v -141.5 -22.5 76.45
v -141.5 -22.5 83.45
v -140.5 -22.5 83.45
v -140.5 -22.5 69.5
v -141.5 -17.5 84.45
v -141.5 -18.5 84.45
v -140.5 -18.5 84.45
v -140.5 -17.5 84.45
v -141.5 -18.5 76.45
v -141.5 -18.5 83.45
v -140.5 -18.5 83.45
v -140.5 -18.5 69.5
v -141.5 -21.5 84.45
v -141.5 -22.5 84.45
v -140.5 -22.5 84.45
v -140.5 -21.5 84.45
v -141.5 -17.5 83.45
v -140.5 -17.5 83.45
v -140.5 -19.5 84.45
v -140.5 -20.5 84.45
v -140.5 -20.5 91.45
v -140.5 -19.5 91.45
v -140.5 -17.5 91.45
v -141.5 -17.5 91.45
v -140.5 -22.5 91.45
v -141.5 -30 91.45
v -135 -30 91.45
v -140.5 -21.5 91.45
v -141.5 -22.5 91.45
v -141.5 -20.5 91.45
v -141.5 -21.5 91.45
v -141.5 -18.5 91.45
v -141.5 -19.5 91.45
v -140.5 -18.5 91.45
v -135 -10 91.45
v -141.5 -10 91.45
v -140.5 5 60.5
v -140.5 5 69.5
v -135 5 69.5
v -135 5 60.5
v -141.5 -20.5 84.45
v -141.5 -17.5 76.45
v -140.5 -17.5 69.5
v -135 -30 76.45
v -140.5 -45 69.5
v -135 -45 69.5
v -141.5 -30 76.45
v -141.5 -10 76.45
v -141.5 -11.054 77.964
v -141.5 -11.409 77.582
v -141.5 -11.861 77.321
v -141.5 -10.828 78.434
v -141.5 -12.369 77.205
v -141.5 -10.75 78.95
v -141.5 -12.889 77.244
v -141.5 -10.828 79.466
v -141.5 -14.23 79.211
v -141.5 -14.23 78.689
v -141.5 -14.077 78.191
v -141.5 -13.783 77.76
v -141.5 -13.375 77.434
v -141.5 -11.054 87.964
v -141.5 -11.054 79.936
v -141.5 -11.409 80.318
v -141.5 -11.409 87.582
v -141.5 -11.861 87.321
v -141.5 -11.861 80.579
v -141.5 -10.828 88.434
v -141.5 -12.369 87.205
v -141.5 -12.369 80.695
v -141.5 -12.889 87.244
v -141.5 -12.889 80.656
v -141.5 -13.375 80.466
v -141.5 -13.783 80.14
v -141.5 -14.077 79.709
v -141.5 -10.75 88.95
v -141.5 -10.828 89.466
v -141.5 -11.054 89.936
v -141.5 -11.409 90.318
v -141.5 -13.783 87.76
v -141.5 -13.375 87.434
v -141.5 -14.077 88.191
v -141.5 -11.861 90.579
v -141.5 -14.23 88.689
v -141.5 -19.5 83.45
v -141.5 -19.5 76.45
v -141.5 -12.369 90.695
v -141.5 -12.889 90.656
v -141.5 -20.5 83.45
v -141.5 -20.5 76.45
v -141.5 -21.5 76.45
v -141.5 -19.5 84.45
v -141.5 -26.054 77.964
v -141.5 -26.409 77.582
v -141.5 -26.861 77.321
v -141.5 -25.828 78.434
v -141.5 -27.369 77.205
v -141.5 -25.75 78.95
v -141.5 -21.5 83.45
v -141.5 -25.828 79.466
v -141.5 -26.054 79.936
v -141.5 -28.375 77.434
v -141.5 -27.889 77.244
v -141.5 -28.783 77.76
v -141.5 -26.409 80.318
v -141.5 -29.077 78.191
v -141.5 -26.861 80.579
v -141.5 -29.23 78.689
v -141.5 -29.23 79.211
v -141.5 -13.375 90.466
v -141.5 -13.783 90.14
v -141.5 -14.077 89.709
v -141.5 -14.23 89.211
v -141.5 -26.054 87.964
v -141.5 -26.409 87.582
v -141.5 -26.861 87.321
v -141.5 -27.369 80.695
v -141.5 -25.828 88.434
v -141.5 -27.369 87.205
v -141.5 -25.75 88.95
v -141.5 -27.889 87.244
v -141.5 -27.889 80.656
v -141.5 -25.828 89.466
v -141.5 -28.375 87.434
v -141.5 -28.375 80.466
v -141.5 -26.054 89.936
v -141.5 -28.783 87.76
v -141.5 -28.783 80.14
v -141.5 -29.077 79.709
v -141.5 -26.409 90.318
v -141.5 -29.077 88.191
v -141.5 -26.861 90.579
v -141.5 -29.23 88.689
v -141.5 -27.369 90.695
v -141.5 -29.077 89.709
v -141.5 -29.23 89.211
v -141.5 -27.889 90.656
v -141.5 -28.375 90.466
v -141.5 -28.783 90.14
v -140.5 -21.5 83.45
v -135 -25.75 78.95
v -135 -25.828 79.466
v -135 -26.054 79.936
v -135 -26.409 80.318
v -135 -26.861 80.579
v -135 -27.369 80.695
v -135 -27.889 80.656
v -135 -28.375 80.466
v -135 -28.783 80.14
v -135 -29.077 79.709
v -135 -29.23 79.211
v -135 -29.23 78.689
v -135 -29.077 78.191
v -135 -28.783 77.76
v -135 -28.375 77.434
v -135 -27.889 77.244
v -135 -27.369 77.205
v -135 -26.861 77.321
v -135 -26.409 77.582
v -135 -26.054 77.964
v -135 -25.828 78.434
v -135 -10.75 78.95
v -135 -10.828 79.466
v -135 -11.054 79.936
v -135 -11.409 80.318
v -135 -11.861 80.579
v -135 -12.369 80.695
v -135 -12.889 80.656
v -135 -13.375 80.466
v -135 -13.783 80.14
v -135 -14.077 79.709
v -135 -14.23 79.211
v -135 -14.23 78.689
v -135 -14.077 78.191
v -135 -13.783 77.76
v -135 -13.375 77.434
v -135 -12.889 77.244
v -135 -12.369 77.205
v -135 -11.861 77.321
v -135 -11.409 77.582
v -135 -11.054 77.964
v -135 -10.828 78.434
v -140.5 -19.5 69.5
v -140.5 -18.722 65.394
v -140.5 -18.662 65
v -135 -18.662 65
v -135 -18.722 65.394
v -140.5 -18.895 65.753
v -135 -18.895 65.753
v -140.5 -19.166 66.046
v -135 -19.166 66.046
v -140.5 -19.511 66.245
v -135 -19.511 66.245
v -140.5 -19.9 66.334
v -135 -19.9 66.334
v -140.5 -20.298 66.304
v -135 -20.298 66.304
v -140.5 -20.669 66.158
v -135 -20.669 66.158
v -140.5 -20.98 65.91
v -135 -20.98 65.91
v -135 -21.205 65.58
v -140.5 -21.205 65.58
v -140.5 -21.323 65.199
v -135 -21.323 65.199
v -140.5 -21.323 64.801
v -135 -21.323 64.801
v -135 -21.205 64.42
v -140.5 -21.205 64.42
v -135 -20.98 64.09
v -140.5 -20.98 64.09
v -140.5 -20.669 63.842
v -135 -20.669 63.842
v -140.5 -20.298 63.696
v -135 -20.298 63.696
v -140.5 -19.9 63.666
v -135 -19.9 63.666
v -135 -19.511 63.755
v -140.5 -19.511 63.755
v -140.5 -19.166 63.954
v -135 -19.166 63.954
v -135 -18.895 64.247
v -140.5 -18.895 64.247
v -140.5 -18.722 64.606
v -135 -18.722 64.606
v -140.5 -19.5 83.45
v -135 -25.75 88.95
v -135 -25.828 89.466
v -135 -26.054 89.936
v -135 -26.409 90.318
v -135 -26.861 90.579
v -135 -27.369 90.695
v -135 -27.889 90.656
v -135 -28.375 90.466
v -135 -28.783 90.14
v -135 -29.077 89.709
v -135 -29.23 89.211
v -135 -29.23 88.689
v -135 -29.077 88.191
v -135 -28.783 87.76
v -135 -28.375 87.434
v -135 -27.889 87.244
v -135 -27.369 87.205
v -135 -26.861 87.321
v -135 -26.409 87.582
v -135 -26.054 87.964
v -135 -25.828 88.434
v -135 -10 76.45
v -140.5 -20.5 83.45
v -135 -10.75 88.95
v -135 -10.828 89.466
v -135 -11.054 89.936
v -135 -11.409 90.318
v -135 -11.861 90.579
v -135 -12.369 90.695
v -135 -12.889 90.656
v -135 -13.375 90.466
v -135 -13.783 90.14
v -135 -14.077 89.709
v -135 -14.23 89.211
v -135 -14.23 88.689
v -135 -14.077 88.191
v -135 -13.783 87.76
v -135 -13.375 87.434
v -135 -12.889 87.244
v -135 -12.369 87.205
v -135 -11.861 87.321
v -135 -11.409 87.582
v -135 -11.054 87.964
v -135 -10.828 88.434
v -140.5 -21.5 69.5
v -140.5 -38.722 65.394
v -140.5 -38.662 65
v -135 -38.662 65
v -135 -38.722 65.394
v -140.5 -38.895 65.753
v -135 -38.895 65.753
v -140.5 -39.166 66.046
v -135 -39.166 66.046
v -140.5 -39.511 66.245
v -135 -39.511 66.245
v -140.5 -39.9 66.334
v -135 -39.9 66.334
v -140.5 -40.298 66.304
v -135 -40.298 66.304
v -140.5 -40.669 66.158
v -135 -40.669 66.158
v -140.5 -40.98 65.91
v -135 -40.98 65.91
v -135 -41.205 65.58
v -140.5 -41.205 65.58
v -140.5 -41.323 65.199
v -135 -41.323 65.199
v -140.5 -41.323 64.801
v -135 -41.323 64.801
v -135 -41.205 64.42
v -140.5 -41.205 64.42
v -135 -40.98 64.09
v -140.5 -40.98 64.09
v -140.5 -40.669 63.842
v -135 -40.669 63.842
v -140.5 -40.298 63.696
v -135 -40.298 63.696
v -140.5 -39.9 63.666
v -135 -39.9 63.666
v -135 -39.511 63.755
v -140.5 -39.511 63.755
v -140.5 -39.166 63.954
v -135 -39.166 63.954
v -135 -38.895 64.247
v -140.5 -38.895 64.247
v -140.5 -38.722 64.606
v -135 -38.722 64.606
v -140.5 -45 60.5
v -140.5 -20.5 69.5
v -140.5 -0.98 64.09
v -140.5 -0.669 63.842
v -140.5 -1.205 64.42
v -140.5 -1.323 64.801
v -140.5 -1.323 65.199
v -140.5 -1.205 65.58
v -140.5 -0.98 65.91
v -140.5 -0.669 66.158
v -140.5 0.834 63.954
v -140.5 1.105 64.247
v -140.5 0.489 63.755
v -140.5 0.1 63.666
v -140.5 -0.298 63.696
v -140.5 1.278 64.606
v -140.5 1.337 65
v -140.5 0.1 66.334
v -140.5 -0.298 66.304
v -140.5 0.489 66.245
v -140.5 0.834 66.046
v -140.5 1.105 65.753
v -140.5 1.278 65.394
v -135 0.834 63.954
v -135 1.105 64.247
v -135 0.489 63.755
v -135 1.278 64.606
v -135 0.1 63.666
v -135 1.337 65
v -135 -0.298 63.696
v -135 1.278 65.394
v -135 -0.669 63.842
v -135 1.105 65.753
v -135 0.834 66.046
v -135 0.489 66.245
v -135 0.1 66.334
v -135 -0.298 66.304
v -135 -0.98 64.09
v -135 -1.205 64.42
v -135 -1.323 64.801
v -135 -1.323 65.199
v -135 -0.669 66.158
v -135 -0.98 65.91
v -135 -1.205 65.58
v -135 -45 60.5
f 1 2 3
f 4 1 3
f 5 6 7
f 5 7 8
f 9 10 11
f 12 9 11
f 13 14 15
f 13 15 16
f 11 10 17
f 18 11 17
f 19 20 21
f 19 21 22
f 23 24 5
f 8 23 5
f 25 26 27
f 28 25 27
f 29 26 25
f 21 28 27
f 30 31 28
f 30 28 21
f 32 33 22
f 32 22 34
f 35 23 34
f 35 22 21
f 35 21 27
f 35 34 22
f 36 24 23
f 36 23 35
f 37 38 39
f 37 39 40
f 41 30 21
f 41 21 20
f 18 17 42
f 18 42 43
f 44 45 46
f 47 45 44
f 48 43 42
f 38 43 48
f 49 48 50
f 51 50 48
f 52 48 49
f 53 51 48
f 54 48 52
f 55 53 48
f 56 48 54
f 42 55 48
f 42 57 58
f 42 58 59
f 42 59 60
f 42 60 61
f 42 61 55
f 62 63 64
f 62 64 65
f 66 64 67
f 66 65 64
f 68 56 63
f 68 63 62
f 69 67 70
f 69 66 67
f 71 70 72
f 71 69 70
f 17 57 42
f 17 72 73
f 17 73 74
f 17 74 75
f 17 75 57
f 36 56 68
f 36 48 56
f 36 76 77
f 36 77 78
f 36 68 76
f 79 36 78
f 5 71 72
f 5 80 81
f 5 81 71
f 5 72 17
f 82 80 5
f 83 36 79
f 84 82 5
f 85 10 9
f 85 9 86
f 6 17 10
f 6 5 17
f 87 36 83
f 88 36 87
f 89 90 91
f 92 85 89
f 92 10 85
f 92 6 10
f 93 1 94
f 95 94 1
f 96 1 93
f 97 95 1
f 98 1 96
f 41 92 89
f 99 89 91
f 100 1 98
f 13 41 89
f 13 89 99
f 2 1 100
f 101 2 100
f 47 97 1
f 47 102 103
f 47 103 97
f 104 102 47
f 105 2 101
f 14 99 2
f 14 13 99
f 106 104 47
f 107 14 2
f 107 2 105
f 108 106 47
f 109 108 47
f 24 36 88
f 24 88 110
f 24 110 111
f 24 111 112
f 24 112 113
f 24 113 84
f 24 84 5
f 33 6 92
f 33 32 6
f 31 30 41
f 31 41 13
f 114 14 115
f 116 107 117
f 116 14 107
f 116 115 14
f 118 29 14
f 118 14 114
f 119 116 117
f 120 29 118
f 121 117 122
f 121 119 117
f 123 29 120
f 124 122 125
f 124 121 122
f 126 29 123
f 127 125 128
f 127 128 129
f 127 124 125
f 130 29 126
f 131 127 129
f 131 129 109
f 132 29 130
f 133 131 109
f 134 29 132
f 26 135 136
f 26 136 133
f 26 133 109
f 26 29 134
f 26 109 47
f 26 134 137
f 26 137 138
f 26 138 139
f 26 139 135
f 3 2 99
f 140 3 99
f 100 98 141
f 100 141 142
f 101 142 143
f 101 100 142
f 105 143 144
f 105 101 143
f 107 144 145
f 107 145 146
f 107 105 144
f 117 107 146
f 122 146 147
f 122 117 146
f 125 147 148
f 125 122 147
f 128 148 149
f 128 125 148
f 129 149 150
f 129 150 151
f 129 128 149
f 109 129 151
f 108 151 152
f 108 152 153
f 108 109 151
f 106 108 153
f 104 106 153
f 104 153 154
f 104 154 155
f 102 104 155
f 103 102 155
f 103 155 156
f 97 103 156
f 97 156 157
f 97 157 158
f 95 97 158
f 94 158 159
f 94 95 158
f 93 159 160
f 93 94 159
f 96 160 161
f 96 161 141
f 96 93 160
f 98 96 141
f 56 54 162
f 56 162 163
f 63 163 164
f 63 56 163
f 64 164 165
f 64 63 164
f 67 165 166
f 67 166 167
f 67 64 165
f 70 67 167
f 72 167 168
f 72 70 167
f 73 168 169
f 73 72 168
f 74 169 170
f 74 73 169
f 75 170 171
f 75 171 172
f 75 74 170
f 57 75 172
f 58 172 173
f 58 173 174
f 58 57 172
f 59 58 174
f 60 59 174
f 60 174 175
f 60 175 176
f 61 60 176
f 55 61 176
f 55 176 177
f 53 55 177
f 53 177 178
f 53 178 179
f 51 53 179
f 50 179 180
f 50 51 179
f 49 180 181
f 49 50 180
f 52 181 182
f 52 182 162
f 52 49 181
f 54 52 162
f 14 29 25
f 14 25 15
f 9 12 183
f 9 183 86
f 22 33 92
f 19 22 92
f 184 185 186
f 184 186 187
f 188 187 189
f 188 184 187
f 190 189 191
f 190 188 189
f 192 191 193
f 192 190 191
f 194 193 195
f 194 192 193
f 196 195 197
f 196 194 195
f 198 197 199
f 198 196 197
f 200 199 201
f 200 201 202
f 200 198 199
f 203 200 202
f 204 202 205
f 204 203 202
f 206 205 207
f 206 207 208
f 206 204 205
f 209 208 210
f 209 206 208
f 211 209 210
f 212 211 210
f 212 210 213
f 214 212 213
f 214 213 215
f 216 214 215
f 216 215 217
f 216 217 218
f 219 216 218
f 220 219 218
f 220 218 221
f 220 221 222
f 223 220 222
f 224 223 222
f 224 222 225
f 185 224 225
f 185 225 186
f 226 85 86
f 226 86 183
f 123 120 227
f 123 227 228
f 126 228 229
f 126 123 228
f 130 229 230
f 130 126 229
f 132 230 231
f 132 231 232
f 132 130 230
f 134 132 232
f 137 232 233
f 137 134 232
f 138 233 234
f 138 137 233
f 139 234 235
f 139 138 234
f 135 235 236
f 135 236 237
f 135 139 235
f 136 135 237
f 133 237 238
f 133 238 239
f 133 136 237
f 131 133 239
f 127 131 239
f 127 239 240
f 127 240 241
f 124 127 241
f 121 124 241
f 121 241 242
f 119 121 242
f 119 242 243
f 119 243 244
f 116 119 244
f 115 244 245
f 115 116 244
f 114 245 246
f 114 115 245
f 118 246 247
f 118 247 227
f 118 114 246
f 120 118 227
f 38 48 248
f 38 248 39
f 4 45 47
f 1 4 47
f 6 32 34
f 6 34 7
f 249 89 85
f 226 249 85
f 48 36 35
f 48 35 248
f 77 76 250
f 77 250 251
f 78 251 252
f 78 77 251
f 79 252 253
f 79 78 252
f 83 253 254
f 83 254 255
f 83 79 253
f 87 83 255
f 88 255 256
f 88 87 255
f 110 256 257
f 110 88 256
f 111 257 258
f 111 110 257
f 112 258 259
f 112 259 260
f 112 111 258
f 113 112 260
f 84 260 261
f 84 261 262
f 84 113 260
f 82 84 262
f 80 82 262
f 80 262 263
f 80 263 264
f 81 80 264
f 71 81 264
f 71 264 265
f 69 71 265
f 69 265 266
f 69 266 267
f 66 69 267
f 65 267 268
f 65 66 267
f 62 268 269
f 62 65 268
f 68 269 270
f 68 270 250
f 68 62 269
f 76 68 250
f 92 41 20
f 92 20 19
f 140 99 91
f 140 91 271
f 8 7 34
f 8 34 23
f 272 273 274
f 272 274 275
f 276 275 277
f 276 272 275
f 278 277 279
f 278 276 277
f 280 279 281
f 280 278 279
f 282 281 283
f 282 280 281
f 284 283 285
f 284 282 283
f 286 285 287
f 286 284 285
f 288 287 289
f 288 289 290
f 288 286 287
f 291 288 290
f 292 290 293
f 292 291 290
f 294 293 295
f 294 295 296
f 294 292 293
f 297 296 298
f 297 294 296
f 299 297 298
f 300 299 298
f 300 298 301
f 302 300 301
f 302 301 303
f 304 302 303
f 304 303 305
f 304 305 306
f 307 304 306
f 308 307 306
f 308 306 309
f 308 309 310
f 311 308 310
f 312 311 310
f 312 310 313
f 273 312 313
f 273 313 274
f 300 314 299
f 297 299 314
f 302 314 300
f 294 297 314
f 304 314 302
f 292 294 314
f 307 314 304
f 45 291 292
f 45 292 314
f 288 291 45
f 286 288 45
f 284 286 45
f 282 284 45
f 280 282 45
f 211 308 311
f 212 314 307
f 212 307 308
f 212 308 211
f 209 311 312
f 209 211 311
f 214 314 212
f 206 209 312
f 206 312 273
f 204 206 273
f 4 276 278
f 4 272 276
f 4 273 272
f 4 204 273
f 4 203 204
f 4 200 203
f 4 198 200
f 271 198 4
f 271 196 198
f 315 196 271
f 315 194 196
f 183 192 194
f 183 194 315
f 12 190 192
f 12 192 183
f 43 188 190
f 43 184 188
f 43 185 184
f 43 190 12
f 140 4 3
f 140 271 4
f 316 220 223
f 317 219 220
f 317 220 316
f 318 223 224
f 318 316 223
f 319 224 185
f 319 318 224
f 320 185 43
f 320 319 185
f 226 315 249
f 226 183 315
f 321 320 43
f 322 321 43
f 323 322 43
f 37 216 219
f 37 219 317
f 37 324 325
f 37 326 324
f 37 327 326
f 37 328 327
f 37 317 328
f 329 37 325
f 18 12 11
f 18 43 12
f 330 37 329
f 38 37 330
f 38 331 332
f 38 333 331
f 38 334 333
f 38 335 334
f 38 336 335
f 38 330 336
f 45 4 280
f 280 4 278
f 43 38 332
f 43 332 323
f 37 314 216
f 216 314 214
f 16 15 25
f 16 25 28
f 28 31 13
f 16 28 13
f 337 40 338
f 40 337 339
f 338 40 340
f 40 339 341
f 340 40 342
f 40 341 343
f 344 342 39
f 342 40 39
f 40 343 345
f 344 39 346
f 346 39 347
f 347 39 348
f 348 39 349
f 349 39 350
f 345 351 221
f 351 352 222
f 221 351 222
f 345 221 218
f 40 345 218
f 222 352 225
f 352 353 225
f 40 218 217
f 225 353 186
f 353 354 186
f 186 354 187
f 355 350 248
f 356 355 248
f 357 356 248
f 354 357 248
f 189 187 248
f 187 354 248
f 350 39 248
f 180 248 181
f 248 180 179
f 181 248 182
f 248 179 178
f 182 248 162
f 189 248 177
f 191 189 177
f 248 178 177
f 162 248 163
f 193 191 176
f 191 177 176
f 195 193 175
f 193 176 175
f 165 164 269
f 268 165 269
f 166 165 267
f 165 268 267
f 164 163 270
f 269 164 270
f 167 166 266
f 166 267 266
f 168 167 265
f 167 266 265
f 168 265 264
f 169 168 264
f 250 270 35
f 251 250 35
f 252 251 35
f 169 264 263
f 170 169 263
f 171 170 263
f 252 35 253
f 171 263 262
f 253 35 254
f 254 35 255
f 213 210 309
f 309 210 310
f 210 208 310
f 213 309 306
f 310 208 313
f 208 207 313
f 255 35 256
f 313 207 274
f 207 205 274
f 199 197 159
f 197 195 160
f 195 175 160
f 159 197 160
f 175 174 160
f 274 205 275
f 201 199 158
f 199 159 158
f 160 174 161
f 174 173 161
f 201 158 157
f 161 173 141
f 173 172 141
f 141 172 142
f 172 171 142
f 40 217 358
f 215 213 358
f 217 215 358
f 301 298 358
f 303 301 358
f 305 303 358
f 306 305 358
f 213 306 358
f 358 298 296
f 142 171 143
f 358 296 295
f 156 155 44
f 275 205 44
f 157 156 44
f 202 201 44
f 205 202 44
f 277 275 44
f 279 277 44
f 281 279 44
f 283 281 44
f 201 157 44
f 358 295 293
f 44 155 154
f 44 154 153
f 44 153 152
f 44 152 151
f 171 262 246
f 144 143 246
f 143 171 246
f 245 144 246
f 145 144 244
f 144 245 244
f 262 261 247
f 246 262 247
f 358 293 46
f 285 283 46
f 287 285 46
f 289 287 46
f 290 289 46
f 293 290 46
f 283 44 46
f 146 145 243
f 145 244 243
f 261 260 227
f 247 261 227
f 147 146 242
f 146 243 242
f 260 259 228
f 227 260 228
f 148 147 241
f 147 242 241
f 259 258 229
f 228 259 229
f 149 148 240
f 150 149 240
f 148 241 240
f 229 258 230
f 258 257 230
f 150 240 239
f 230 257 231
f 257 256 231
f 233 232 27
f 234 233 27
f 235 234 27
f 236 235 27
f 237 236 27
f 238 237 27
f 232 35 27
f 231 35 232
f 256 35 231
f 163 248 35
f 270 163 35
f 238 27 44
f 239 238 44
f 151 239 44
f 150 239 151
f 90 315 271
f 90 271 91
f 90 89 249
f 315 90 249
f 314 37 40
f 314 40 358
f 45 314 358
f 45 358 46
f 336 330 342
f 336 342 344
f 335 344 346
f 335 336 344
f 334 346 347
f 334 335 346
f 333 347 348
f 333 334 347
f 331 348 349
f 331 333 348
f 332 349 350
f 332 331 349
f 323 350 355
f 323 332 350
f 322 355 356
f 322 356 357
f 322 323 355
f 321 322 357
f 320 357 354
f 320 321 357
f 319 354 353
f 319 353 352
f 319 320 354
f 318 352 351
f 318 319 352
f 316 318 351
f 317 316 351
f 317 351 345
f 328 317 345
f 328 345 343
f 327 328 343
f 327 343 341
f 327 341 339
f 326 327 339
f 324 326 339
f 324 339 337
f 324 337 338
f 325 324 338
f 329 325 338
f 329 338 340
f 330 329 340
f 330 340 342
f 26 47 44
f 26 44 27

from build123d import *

# Parameters (mm, degrees)
SKETCH047_R          = 1.75
SKETCH047_R_2        = 1.3375
PAD025_DEPTH         = 6.5
POCKET021_DEPTH      = 25.001
POCKET021_DEPTH_BACK = 25.001
SKETCH056_W          = 1
SKETCH056_H          = 22.95
SKETCH056_H_2        = 7
POCKET025_DEPTH      = 1


with BuildPart() as part:
    # Sketch047 → Pad025 (new body)
    with BuildSketch(Plane.YZ):
        Polygon((-10, 30.95), (10, 30.95), (10, 15.95), (25, 9), (25, 0), (-25, 0), (-25, 9), (-10, 15.95), align=None)
        with Locations((-7.5, 28.45)):
            Circle(SKETCH047_R, mode=Mode.SUBTRACT)
        with Locations((7.5, 28.45)):
            Circle(SKETCH047_R, mode=Mode.SUBTRACT)
        with Locations((7.5, 18.45)):
            Circle(SKETCH047_R, mode=Mode.SUBTRACT)
        with Locations((-7.5, 18.45)):
            Circle(SKETCH047_R, mode=Mode.SUBTRACT)
        with Locations((-20, 4.5)):
            Circle(SKETCH047_R_2, mode=Mode.SUBTRACT)
        with Locations((0, 4.5)):
            Circle(SKETCH047_R_2, mode=Mode.SUBTRACT)
        with Locations((20, 4.5)):
            Circle(SKETCH047_R_2, mode=Mode.SUBTRACT)
    extrude(amount=PAD025_DEPTH)

    # Sketch048 → Pocket021 (cut, two sides)
    with BuildSketch(Plane.XZ) as pocket021_sk:
        Polygon((0, 15.95), (0, 0), (1, 0), (1, 9), align=None)
    extrude(amount=-POCKET021_DEPTH, mode=Mode.SUBTRACT)
    extrude(pocket021_sk.sketch, amount=POCKET021_DEPTH_BACK, mode=Mode.SUBTRACT)

    # Sketch056 (on Face4 of Pocket021) → Pocket025 (cut)
    with BuildSketch(Plane(origin=(0, 0, 0), x_dir=(0, 1, 0), z_dir=(-1, 0, 0))):
        with Locations((0, -11.475)):
            Rectangle(SKETCH056_W, SKETCH056_H)
        with Locations((0, -27.45)):
            Rectangle(SKETCH056_W, SKETCH056_H_2)
        with Locations((-2, -11.475)):
            Rectangle(SKETCH056_W, SKETCH056_H)
        with Locations((-2, -27.45)):
            Rectangle(SKETCH056_W, SKETCH056_H_2)
        with Locations((2, -11.475)):
            Rectangle(SKETCH056_W, SKETCH056_H)
        with Locations((2, -27.45)):
            Rectangle(SKETCH056_W, SKETCH056_H_2)
    extrude(amount=-POCKET025_DEPTH, mode=Mode.SUBTRACT)


with BuildPart() as part_1:
    # Body011 placement: moved
    add(part.part.moved(Location((-141.5, -20, 60.5))))


solid = part_1.part
